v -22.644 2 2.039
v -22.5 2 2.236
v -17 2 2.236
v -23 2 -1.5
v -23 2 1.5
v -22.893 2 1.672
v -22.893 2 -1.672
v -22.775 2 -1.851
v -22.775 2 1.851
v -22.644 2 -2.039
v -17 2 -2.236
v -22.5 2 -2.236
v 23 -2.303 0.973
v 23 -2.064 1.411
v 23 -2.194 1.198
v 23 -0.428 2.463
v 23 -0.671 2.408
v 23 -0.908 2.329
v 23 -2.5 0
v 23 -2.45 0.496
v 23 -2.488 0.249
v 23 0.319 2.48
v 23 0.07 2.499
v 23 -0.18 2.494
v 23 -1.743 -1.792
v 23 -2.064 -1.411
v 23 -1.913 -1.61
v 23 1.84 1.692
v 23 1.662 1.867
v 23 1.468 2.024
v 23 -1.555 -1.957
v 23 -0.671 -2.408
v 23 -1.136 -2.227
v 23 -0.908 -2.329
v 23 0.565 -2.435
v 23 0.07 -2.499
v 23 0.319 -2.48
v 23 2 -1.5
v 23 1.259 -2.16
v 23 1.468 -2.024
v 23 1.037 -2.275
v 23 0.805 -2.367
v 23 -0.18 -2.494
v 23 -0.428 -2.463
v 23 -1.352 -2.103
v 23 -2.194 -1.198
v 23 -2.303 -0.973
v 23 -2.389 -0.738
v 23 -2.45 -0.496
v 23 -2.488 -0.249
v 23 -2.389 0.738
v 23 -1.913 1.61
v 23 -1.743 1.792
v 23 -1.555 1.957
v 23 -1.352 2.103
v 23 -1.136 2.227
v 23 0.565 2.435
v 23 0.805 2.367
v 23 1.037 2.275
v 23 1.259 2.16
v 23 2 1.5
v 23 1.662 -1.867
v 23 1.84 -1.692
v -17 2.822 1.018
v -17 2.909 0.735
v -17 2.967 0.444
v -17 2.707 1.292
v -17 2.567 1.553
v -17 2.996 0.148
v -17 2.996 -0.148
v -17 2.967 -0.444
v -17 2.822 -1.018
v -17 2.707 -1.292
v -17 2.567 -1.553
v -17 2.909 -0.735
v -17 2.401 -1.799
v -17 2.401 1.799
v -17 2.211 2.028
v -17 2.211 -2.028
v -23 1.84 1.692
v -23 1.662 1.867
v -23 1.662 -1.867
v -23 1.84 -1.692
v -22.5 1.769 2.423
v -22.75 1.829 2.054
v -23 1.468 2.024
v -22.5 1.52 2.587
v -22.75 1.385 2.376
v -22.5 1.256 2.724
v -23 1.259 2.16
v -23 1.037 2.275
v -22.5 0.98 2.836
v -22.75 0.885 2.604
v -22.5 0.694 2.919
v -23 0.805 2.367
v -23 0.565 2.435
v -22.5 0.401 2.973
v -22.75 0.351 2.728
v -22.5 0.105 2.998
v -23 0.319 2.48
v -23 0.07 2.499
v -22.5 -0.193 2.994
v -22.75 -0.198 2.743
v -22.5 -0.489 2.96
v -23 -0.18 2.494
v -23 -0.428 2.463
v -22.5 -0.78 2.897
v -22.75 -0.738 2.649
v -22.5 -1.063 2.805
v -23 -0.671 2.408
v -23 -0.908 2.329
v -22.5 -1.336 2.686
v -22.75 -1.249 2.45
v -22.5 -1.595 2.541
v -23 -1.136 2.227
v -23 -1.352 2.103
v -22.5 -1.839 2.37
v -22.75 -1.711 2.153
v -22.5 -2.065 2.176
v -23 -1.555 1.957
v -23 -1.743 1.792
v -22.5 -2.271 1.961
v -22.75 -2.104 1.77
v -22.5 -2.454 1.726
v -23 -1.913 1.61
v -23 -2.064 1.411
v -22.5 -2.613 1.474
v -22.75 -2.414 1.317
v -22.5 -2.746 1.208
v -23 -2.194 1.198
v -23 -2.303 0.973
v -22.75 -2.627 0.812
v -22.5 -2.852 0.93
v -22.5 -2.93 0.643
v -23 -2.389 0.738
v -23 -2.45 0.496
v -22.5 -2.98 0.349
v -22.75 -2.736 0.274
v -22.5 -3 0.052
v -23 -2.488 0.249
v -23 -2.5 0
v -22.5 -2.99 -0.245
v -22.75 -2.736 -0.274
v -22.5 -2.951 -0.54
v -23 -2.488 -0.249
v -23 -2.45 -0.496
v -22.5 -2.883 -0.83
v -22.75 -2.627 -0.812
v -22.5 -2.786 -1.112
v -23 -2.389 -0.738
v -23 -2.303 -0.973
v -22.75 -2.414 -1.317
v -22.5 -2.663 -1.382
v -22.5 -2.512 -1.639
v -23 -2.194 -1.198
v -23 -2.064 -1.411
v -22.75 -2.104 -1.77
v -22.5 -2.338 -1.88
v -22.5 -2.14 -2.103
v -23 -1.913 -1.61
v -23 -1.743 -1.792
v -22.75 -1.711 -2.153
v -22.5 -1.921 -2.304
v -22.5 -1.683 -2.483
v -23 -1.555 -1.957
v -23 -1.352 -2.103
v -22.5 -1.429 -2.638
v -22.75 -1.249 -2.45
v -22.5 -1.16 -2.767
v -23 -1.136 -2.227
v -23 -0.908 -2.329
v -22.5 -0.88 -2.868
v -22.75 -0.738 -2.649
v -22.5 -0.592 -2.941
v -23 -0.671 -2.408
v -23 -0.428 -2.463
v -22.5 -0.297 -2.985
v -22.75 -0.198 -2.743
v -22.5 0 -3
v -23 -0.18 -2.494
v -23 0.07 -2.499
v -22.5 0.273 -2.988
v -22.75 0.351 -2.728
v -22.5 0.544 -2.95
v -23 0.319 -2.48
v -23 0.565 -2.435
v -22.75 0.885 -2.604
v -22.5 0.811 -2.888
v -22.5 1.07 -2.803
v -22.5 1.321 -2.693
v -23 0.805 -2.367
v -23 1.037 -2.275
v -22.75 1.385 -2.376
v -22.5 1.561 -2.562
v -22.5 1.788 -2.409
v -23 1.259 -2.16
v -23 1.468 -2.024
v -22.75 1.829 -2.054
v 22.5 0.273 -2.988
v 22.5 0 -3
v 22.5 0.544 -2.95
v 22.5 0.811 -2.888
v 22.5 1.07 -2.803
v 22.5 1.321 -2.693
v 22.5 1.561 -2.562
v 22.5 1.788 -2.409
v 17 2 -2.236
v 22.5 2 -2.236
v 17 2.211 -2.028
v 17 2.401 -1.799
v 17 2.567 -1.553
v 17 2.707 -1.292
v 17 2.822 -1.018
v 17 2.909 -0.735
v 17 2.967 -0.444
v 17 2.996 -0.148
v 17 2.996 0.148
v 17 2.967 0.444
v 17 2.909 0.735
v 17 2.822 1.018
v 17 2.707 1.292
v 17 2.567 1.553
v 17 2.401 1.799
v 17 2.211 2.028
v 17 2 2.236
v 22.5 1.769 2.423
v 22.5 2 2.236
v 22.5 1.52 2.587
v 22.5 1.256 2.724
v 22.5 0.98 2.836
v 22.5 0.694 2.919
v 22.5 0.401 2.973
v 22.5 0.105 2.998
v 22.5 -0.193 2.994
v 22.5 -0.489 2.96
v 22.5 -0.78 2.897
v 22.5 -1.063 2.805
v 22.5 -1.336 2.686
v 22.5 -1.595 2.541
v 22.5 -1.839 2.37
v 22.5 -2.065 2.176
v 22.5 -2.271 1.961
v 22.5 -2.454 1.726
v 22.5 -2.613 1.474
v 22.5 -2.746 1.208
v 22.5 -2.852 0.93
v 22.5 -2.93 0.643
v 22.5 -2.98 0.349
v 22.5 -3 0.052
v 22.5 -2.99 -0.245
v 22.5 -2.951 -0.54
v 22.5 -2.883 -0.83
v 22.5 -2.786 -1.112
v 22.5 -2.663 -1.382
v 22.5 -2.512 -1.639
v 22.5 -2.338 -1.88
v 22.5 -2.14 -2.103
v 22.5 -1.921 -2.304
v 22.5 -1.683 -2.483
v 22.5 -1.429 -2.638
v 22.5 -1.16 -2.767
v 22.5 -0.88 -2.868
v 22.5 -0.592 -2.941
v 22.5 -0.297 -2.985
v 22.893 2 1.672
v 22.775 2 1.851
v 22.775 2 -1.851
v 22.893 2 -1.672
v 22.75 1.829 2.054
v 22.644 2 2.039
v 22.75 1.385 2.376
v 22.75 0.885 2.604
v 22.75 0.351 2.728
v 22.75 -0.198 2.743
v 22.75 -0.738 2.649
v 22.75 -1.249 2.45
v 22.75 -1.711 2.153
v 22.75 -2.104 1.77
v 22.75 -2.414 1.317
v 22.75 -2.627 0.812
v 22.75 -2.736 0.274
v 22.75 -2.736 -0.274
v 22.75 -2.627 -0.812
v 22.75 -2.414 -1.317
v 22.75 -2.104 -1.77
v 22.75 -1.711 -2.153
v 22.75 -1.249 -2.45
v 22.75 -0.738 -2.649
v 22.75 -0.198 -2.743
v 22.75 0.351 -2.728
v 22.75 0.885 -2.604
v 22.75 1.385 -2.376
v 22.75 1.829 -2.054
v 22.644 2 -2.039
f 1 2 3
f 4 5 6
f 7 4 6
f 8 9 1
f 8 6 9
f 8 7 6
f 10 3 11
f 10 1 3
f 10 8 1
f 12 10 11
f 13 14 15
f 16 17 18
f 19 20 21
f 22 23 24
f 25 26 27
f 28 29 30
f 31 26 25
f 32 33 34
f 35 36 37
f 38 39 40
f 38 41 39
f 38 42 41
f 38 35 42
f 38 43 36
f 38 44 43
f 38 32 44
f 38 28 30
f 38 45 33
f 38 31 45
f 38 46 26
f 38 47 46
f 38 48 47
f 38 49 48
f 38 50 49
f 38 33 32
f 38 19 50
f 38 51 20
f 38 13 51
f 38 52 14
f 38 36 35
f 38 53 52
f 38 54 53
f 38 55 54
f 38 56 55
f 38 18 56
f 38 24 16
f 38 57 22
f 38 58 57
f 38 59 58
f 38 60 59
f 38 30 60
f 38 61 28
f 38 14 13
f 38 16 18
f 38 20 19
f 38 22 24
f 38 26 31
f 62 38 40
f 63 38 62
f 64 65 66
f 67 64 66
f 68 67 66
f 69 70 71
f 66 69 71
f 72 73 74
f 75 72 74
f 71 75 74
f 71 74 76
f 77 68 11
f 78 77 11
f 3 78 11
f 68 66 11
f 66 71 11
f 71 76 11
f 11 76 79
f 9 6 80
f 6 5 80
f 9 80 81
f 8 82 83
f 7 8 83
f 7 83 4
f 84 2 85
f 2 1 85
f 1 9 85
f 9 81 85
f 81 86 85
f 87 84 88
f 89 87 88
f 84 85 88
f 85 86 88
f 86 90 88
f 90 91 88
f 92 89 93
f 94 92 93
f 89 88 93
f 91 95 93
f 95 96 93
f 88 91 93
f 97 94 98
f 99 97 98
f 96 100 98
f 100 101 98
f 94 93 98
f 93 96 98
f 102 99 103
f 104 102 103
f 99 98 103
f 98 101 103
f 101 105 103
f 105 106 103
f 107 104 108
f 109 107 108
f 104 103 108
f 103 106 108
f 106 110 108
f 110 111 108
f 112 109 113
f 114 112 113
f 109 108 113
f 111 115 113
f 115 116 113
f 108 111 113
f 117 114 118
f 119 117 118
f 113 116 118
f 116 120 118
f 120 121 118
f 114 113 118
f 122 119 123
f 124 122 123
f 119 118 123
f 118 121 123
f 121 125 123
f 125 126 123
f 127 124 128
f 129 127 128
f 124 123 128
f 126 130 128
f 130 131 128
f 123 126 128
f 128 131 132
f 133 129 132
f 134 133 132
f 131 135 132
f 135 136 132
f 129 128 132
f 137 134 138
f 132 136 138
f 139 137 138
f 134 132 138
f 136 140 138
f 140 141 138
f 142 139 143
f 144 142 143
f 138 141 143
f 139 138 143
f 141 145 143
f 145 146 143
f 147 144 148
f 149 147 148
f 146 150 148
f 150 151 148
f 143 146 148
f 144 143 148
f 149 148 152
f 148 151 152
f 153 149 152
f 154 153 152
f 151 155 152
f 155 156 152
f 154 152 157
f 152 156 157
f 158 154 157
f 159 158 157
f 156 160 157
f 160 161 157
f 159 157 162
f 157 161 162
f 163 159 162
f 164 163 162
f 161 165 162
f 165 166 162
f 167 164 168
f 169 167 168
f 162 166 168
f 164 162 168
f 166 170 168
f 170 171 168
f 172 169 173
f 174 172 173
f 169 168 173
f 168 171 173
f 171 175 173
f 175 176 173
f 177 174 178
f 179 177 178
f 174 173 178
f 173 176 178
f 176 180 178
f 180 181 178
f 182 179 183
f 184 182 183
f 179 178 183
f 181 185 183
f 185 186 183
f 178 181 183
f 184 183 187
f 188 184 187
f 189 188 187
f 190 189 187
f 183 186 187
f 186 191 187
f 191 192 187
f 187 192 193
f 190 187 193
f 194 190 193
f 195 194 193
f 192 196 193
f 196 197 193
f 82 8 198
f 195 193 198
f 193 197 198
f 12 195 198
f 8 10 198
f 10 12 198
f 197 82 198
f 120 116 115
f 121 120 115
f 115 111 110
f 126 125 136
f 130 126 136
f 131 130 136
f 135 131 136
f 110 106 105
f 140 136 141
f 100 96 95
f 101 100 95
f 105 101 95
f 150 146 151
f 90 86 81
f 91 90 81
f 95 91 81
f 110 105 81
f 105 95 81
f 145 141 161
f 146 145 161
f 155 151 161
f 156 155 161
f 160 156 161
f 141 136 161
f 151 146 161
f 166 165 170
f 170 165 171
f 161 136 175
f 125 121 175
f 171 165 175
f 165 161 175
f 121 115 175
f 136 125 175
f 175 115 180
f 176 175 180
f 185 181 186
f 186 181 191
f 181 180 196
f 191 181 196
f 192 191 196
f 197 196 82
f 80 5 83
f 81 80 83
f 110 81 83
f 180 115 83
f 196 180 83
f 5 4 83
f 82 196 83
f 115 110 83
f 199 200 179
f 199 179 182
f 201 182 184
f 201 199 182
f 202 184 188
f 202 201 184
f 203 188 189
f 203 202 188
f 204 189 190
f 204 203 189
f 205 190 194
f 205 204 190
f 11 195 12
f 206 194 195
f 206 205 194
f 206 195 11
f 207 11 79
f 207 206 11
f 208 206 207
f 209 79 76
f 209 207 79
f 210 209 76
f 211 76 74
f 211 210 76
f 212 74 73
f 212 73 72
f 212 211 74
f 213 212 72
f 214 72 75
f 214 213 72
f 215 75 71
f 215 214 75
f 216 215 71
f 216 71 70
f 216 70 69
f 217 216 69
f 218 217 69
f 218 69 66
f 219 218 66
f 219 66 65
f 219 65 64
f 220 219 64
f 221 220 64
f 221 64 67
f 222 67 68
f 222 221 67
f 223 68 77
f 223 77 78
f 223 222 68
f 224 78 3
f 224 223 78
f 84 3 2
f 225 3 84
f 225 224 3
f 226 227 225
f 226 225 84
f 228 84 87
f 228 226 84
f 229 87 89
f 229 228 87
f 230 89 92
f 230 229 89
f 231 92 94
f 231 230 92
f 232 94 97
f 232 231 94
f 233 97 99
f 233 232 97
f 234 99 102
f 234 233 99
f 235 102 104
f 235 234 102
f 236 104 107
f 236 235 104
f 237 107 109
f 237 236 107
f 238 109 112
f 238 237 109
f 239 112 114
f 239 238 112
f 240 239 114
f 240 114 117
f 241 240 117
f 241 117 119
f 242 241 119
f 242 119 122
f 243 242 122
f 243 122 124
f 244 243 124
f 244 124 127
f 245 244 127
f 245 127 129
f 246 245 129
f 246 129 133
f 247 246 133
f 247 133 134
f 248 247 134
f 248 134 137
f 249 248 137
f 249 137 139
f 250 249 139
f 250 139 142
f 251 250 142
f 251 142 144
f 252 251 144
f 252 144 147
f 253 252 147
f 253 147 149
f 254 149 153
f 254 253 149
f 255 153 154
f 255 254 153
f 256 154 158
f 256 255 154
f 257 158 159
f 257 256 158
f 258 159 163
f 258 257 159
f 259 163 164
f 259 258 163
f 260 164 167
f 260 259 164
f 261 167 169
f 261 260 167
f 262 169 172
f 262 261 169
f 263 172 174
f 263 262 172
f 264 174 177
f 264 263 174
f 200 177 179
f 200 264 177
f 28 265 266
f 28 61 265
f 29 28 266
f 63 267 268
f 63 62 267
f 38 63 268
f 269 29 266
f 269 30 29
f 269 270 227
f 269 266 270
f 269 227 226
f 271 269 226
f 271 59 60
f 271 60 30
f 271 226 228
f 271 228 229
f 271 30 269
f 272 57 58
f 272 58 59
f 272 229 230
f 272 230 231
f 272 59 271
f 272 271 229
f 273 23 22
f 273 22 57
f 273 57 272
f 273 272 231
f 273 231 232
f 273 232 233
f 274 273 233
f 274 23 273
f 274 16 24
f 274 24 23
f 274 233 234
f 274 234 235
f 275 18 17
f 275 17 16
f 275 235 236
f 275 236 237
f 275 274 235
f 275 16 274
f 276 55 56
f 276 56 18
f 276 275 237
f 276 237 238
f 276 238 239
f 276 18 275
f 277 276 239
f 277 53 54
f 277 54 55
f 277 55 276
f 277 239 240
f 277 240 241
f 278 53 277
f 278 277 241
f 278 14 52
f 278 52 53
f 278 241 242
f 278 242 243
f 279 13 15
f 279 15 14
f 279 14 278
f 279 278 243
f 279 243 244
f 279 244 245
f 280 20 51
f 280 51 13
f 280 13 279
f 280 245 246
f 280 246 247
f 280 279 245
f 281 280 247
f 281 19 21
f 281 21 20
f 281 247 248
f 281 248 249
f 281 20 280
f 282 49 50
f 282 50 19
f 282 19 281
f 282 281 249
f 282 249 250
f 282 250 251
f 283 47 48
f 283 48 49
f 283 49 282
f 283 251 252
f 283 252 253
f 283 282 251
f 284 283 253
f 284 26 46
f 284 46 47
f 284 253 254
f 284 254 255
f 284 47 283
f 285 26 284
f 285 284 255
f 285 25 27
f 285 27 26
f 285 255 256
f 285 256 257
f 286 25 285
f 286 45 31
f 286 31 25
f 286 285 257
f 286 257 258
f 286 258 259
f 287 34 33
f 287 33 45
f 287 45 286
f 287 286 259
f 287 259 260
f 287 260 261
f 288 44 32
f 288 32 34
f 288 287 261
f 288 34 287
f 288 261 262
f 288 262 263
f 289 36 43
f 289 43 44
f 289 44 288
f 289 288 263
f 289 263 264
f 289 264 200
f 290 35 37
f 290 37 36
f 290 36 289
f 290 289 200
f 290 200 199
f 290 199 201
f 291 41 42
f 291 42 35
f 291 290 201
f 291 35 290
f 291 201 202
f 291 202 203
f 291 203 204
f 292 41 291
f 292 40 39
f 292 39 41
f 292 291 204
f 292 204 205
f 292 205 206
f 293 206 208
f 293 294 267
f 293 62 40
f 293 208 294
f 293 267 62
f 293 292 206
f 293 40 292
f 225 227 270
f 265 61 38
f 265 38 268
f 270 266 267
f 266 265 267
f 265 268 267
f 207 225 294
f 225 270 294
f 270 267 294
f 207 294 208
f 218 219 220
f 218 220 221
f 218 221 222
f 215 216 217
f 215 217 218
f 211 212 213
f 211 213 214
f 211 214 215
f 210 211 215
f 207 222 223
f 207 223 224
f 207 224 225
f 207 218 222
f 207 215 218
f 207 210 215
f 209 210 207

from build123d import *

# Parameters (mm, degrees)
SKETCH1_R           = 3
BOSS_EXTRUDE1_DEPTH = 23
CHAMFER1_SIZE       = 0.5
CUT_EXTRUDE1_DEPTH  = 6


with BuildPart() as part:
    # Sketch1 → Boss-Extrude1 (new body, symmetric)
    with BuildSketch(Plane(origin=(0, 0, 0), x_dir=(0, 0, -1), z_dir=(1, 0, 0))):
        Circle(SKETCH1_R)
    extrude(amount=BOSS_EXTRUDE1_DEPTH, both=True)

    # Chamfer1
    chamfer1_edges = [part.edges().sort_by_distance(p)[0] for p in [
        (-23, 0, 3),
        (23, 0, 3),
    ]]
    chamfer(chamfer1_edges, length=CHAMFER1_SIZE)

    # Sketch2 → Cut-Extrude1 (cut)
    with BuildSketch(Plane(origin=(23, 0, 0), x_dir=(0, 0, -1), z_dir=(1, 0, 0))):
        with BuildLine():
            Line((-2.236067977, 2), (2.236067977, 2))
            ThreePointArc((2.236067977, 2), (0, 3), (-2.236067977, 2))
        make_face()
    cut_extrude1 = extrude(amount=-CUT_EXTRUDE1_DEPTH, mode=Mode.SUBTRACT)

    # Mirror1: Cut-Extrude1 across plane
    add(cut_extrude1.mirror(Plane(origin=(0, 0, 0), x_dir=(0, 0, 1), z_dir=(1, 0, 0))), mode=Mode.SUBTRACT)


solid = part.part
